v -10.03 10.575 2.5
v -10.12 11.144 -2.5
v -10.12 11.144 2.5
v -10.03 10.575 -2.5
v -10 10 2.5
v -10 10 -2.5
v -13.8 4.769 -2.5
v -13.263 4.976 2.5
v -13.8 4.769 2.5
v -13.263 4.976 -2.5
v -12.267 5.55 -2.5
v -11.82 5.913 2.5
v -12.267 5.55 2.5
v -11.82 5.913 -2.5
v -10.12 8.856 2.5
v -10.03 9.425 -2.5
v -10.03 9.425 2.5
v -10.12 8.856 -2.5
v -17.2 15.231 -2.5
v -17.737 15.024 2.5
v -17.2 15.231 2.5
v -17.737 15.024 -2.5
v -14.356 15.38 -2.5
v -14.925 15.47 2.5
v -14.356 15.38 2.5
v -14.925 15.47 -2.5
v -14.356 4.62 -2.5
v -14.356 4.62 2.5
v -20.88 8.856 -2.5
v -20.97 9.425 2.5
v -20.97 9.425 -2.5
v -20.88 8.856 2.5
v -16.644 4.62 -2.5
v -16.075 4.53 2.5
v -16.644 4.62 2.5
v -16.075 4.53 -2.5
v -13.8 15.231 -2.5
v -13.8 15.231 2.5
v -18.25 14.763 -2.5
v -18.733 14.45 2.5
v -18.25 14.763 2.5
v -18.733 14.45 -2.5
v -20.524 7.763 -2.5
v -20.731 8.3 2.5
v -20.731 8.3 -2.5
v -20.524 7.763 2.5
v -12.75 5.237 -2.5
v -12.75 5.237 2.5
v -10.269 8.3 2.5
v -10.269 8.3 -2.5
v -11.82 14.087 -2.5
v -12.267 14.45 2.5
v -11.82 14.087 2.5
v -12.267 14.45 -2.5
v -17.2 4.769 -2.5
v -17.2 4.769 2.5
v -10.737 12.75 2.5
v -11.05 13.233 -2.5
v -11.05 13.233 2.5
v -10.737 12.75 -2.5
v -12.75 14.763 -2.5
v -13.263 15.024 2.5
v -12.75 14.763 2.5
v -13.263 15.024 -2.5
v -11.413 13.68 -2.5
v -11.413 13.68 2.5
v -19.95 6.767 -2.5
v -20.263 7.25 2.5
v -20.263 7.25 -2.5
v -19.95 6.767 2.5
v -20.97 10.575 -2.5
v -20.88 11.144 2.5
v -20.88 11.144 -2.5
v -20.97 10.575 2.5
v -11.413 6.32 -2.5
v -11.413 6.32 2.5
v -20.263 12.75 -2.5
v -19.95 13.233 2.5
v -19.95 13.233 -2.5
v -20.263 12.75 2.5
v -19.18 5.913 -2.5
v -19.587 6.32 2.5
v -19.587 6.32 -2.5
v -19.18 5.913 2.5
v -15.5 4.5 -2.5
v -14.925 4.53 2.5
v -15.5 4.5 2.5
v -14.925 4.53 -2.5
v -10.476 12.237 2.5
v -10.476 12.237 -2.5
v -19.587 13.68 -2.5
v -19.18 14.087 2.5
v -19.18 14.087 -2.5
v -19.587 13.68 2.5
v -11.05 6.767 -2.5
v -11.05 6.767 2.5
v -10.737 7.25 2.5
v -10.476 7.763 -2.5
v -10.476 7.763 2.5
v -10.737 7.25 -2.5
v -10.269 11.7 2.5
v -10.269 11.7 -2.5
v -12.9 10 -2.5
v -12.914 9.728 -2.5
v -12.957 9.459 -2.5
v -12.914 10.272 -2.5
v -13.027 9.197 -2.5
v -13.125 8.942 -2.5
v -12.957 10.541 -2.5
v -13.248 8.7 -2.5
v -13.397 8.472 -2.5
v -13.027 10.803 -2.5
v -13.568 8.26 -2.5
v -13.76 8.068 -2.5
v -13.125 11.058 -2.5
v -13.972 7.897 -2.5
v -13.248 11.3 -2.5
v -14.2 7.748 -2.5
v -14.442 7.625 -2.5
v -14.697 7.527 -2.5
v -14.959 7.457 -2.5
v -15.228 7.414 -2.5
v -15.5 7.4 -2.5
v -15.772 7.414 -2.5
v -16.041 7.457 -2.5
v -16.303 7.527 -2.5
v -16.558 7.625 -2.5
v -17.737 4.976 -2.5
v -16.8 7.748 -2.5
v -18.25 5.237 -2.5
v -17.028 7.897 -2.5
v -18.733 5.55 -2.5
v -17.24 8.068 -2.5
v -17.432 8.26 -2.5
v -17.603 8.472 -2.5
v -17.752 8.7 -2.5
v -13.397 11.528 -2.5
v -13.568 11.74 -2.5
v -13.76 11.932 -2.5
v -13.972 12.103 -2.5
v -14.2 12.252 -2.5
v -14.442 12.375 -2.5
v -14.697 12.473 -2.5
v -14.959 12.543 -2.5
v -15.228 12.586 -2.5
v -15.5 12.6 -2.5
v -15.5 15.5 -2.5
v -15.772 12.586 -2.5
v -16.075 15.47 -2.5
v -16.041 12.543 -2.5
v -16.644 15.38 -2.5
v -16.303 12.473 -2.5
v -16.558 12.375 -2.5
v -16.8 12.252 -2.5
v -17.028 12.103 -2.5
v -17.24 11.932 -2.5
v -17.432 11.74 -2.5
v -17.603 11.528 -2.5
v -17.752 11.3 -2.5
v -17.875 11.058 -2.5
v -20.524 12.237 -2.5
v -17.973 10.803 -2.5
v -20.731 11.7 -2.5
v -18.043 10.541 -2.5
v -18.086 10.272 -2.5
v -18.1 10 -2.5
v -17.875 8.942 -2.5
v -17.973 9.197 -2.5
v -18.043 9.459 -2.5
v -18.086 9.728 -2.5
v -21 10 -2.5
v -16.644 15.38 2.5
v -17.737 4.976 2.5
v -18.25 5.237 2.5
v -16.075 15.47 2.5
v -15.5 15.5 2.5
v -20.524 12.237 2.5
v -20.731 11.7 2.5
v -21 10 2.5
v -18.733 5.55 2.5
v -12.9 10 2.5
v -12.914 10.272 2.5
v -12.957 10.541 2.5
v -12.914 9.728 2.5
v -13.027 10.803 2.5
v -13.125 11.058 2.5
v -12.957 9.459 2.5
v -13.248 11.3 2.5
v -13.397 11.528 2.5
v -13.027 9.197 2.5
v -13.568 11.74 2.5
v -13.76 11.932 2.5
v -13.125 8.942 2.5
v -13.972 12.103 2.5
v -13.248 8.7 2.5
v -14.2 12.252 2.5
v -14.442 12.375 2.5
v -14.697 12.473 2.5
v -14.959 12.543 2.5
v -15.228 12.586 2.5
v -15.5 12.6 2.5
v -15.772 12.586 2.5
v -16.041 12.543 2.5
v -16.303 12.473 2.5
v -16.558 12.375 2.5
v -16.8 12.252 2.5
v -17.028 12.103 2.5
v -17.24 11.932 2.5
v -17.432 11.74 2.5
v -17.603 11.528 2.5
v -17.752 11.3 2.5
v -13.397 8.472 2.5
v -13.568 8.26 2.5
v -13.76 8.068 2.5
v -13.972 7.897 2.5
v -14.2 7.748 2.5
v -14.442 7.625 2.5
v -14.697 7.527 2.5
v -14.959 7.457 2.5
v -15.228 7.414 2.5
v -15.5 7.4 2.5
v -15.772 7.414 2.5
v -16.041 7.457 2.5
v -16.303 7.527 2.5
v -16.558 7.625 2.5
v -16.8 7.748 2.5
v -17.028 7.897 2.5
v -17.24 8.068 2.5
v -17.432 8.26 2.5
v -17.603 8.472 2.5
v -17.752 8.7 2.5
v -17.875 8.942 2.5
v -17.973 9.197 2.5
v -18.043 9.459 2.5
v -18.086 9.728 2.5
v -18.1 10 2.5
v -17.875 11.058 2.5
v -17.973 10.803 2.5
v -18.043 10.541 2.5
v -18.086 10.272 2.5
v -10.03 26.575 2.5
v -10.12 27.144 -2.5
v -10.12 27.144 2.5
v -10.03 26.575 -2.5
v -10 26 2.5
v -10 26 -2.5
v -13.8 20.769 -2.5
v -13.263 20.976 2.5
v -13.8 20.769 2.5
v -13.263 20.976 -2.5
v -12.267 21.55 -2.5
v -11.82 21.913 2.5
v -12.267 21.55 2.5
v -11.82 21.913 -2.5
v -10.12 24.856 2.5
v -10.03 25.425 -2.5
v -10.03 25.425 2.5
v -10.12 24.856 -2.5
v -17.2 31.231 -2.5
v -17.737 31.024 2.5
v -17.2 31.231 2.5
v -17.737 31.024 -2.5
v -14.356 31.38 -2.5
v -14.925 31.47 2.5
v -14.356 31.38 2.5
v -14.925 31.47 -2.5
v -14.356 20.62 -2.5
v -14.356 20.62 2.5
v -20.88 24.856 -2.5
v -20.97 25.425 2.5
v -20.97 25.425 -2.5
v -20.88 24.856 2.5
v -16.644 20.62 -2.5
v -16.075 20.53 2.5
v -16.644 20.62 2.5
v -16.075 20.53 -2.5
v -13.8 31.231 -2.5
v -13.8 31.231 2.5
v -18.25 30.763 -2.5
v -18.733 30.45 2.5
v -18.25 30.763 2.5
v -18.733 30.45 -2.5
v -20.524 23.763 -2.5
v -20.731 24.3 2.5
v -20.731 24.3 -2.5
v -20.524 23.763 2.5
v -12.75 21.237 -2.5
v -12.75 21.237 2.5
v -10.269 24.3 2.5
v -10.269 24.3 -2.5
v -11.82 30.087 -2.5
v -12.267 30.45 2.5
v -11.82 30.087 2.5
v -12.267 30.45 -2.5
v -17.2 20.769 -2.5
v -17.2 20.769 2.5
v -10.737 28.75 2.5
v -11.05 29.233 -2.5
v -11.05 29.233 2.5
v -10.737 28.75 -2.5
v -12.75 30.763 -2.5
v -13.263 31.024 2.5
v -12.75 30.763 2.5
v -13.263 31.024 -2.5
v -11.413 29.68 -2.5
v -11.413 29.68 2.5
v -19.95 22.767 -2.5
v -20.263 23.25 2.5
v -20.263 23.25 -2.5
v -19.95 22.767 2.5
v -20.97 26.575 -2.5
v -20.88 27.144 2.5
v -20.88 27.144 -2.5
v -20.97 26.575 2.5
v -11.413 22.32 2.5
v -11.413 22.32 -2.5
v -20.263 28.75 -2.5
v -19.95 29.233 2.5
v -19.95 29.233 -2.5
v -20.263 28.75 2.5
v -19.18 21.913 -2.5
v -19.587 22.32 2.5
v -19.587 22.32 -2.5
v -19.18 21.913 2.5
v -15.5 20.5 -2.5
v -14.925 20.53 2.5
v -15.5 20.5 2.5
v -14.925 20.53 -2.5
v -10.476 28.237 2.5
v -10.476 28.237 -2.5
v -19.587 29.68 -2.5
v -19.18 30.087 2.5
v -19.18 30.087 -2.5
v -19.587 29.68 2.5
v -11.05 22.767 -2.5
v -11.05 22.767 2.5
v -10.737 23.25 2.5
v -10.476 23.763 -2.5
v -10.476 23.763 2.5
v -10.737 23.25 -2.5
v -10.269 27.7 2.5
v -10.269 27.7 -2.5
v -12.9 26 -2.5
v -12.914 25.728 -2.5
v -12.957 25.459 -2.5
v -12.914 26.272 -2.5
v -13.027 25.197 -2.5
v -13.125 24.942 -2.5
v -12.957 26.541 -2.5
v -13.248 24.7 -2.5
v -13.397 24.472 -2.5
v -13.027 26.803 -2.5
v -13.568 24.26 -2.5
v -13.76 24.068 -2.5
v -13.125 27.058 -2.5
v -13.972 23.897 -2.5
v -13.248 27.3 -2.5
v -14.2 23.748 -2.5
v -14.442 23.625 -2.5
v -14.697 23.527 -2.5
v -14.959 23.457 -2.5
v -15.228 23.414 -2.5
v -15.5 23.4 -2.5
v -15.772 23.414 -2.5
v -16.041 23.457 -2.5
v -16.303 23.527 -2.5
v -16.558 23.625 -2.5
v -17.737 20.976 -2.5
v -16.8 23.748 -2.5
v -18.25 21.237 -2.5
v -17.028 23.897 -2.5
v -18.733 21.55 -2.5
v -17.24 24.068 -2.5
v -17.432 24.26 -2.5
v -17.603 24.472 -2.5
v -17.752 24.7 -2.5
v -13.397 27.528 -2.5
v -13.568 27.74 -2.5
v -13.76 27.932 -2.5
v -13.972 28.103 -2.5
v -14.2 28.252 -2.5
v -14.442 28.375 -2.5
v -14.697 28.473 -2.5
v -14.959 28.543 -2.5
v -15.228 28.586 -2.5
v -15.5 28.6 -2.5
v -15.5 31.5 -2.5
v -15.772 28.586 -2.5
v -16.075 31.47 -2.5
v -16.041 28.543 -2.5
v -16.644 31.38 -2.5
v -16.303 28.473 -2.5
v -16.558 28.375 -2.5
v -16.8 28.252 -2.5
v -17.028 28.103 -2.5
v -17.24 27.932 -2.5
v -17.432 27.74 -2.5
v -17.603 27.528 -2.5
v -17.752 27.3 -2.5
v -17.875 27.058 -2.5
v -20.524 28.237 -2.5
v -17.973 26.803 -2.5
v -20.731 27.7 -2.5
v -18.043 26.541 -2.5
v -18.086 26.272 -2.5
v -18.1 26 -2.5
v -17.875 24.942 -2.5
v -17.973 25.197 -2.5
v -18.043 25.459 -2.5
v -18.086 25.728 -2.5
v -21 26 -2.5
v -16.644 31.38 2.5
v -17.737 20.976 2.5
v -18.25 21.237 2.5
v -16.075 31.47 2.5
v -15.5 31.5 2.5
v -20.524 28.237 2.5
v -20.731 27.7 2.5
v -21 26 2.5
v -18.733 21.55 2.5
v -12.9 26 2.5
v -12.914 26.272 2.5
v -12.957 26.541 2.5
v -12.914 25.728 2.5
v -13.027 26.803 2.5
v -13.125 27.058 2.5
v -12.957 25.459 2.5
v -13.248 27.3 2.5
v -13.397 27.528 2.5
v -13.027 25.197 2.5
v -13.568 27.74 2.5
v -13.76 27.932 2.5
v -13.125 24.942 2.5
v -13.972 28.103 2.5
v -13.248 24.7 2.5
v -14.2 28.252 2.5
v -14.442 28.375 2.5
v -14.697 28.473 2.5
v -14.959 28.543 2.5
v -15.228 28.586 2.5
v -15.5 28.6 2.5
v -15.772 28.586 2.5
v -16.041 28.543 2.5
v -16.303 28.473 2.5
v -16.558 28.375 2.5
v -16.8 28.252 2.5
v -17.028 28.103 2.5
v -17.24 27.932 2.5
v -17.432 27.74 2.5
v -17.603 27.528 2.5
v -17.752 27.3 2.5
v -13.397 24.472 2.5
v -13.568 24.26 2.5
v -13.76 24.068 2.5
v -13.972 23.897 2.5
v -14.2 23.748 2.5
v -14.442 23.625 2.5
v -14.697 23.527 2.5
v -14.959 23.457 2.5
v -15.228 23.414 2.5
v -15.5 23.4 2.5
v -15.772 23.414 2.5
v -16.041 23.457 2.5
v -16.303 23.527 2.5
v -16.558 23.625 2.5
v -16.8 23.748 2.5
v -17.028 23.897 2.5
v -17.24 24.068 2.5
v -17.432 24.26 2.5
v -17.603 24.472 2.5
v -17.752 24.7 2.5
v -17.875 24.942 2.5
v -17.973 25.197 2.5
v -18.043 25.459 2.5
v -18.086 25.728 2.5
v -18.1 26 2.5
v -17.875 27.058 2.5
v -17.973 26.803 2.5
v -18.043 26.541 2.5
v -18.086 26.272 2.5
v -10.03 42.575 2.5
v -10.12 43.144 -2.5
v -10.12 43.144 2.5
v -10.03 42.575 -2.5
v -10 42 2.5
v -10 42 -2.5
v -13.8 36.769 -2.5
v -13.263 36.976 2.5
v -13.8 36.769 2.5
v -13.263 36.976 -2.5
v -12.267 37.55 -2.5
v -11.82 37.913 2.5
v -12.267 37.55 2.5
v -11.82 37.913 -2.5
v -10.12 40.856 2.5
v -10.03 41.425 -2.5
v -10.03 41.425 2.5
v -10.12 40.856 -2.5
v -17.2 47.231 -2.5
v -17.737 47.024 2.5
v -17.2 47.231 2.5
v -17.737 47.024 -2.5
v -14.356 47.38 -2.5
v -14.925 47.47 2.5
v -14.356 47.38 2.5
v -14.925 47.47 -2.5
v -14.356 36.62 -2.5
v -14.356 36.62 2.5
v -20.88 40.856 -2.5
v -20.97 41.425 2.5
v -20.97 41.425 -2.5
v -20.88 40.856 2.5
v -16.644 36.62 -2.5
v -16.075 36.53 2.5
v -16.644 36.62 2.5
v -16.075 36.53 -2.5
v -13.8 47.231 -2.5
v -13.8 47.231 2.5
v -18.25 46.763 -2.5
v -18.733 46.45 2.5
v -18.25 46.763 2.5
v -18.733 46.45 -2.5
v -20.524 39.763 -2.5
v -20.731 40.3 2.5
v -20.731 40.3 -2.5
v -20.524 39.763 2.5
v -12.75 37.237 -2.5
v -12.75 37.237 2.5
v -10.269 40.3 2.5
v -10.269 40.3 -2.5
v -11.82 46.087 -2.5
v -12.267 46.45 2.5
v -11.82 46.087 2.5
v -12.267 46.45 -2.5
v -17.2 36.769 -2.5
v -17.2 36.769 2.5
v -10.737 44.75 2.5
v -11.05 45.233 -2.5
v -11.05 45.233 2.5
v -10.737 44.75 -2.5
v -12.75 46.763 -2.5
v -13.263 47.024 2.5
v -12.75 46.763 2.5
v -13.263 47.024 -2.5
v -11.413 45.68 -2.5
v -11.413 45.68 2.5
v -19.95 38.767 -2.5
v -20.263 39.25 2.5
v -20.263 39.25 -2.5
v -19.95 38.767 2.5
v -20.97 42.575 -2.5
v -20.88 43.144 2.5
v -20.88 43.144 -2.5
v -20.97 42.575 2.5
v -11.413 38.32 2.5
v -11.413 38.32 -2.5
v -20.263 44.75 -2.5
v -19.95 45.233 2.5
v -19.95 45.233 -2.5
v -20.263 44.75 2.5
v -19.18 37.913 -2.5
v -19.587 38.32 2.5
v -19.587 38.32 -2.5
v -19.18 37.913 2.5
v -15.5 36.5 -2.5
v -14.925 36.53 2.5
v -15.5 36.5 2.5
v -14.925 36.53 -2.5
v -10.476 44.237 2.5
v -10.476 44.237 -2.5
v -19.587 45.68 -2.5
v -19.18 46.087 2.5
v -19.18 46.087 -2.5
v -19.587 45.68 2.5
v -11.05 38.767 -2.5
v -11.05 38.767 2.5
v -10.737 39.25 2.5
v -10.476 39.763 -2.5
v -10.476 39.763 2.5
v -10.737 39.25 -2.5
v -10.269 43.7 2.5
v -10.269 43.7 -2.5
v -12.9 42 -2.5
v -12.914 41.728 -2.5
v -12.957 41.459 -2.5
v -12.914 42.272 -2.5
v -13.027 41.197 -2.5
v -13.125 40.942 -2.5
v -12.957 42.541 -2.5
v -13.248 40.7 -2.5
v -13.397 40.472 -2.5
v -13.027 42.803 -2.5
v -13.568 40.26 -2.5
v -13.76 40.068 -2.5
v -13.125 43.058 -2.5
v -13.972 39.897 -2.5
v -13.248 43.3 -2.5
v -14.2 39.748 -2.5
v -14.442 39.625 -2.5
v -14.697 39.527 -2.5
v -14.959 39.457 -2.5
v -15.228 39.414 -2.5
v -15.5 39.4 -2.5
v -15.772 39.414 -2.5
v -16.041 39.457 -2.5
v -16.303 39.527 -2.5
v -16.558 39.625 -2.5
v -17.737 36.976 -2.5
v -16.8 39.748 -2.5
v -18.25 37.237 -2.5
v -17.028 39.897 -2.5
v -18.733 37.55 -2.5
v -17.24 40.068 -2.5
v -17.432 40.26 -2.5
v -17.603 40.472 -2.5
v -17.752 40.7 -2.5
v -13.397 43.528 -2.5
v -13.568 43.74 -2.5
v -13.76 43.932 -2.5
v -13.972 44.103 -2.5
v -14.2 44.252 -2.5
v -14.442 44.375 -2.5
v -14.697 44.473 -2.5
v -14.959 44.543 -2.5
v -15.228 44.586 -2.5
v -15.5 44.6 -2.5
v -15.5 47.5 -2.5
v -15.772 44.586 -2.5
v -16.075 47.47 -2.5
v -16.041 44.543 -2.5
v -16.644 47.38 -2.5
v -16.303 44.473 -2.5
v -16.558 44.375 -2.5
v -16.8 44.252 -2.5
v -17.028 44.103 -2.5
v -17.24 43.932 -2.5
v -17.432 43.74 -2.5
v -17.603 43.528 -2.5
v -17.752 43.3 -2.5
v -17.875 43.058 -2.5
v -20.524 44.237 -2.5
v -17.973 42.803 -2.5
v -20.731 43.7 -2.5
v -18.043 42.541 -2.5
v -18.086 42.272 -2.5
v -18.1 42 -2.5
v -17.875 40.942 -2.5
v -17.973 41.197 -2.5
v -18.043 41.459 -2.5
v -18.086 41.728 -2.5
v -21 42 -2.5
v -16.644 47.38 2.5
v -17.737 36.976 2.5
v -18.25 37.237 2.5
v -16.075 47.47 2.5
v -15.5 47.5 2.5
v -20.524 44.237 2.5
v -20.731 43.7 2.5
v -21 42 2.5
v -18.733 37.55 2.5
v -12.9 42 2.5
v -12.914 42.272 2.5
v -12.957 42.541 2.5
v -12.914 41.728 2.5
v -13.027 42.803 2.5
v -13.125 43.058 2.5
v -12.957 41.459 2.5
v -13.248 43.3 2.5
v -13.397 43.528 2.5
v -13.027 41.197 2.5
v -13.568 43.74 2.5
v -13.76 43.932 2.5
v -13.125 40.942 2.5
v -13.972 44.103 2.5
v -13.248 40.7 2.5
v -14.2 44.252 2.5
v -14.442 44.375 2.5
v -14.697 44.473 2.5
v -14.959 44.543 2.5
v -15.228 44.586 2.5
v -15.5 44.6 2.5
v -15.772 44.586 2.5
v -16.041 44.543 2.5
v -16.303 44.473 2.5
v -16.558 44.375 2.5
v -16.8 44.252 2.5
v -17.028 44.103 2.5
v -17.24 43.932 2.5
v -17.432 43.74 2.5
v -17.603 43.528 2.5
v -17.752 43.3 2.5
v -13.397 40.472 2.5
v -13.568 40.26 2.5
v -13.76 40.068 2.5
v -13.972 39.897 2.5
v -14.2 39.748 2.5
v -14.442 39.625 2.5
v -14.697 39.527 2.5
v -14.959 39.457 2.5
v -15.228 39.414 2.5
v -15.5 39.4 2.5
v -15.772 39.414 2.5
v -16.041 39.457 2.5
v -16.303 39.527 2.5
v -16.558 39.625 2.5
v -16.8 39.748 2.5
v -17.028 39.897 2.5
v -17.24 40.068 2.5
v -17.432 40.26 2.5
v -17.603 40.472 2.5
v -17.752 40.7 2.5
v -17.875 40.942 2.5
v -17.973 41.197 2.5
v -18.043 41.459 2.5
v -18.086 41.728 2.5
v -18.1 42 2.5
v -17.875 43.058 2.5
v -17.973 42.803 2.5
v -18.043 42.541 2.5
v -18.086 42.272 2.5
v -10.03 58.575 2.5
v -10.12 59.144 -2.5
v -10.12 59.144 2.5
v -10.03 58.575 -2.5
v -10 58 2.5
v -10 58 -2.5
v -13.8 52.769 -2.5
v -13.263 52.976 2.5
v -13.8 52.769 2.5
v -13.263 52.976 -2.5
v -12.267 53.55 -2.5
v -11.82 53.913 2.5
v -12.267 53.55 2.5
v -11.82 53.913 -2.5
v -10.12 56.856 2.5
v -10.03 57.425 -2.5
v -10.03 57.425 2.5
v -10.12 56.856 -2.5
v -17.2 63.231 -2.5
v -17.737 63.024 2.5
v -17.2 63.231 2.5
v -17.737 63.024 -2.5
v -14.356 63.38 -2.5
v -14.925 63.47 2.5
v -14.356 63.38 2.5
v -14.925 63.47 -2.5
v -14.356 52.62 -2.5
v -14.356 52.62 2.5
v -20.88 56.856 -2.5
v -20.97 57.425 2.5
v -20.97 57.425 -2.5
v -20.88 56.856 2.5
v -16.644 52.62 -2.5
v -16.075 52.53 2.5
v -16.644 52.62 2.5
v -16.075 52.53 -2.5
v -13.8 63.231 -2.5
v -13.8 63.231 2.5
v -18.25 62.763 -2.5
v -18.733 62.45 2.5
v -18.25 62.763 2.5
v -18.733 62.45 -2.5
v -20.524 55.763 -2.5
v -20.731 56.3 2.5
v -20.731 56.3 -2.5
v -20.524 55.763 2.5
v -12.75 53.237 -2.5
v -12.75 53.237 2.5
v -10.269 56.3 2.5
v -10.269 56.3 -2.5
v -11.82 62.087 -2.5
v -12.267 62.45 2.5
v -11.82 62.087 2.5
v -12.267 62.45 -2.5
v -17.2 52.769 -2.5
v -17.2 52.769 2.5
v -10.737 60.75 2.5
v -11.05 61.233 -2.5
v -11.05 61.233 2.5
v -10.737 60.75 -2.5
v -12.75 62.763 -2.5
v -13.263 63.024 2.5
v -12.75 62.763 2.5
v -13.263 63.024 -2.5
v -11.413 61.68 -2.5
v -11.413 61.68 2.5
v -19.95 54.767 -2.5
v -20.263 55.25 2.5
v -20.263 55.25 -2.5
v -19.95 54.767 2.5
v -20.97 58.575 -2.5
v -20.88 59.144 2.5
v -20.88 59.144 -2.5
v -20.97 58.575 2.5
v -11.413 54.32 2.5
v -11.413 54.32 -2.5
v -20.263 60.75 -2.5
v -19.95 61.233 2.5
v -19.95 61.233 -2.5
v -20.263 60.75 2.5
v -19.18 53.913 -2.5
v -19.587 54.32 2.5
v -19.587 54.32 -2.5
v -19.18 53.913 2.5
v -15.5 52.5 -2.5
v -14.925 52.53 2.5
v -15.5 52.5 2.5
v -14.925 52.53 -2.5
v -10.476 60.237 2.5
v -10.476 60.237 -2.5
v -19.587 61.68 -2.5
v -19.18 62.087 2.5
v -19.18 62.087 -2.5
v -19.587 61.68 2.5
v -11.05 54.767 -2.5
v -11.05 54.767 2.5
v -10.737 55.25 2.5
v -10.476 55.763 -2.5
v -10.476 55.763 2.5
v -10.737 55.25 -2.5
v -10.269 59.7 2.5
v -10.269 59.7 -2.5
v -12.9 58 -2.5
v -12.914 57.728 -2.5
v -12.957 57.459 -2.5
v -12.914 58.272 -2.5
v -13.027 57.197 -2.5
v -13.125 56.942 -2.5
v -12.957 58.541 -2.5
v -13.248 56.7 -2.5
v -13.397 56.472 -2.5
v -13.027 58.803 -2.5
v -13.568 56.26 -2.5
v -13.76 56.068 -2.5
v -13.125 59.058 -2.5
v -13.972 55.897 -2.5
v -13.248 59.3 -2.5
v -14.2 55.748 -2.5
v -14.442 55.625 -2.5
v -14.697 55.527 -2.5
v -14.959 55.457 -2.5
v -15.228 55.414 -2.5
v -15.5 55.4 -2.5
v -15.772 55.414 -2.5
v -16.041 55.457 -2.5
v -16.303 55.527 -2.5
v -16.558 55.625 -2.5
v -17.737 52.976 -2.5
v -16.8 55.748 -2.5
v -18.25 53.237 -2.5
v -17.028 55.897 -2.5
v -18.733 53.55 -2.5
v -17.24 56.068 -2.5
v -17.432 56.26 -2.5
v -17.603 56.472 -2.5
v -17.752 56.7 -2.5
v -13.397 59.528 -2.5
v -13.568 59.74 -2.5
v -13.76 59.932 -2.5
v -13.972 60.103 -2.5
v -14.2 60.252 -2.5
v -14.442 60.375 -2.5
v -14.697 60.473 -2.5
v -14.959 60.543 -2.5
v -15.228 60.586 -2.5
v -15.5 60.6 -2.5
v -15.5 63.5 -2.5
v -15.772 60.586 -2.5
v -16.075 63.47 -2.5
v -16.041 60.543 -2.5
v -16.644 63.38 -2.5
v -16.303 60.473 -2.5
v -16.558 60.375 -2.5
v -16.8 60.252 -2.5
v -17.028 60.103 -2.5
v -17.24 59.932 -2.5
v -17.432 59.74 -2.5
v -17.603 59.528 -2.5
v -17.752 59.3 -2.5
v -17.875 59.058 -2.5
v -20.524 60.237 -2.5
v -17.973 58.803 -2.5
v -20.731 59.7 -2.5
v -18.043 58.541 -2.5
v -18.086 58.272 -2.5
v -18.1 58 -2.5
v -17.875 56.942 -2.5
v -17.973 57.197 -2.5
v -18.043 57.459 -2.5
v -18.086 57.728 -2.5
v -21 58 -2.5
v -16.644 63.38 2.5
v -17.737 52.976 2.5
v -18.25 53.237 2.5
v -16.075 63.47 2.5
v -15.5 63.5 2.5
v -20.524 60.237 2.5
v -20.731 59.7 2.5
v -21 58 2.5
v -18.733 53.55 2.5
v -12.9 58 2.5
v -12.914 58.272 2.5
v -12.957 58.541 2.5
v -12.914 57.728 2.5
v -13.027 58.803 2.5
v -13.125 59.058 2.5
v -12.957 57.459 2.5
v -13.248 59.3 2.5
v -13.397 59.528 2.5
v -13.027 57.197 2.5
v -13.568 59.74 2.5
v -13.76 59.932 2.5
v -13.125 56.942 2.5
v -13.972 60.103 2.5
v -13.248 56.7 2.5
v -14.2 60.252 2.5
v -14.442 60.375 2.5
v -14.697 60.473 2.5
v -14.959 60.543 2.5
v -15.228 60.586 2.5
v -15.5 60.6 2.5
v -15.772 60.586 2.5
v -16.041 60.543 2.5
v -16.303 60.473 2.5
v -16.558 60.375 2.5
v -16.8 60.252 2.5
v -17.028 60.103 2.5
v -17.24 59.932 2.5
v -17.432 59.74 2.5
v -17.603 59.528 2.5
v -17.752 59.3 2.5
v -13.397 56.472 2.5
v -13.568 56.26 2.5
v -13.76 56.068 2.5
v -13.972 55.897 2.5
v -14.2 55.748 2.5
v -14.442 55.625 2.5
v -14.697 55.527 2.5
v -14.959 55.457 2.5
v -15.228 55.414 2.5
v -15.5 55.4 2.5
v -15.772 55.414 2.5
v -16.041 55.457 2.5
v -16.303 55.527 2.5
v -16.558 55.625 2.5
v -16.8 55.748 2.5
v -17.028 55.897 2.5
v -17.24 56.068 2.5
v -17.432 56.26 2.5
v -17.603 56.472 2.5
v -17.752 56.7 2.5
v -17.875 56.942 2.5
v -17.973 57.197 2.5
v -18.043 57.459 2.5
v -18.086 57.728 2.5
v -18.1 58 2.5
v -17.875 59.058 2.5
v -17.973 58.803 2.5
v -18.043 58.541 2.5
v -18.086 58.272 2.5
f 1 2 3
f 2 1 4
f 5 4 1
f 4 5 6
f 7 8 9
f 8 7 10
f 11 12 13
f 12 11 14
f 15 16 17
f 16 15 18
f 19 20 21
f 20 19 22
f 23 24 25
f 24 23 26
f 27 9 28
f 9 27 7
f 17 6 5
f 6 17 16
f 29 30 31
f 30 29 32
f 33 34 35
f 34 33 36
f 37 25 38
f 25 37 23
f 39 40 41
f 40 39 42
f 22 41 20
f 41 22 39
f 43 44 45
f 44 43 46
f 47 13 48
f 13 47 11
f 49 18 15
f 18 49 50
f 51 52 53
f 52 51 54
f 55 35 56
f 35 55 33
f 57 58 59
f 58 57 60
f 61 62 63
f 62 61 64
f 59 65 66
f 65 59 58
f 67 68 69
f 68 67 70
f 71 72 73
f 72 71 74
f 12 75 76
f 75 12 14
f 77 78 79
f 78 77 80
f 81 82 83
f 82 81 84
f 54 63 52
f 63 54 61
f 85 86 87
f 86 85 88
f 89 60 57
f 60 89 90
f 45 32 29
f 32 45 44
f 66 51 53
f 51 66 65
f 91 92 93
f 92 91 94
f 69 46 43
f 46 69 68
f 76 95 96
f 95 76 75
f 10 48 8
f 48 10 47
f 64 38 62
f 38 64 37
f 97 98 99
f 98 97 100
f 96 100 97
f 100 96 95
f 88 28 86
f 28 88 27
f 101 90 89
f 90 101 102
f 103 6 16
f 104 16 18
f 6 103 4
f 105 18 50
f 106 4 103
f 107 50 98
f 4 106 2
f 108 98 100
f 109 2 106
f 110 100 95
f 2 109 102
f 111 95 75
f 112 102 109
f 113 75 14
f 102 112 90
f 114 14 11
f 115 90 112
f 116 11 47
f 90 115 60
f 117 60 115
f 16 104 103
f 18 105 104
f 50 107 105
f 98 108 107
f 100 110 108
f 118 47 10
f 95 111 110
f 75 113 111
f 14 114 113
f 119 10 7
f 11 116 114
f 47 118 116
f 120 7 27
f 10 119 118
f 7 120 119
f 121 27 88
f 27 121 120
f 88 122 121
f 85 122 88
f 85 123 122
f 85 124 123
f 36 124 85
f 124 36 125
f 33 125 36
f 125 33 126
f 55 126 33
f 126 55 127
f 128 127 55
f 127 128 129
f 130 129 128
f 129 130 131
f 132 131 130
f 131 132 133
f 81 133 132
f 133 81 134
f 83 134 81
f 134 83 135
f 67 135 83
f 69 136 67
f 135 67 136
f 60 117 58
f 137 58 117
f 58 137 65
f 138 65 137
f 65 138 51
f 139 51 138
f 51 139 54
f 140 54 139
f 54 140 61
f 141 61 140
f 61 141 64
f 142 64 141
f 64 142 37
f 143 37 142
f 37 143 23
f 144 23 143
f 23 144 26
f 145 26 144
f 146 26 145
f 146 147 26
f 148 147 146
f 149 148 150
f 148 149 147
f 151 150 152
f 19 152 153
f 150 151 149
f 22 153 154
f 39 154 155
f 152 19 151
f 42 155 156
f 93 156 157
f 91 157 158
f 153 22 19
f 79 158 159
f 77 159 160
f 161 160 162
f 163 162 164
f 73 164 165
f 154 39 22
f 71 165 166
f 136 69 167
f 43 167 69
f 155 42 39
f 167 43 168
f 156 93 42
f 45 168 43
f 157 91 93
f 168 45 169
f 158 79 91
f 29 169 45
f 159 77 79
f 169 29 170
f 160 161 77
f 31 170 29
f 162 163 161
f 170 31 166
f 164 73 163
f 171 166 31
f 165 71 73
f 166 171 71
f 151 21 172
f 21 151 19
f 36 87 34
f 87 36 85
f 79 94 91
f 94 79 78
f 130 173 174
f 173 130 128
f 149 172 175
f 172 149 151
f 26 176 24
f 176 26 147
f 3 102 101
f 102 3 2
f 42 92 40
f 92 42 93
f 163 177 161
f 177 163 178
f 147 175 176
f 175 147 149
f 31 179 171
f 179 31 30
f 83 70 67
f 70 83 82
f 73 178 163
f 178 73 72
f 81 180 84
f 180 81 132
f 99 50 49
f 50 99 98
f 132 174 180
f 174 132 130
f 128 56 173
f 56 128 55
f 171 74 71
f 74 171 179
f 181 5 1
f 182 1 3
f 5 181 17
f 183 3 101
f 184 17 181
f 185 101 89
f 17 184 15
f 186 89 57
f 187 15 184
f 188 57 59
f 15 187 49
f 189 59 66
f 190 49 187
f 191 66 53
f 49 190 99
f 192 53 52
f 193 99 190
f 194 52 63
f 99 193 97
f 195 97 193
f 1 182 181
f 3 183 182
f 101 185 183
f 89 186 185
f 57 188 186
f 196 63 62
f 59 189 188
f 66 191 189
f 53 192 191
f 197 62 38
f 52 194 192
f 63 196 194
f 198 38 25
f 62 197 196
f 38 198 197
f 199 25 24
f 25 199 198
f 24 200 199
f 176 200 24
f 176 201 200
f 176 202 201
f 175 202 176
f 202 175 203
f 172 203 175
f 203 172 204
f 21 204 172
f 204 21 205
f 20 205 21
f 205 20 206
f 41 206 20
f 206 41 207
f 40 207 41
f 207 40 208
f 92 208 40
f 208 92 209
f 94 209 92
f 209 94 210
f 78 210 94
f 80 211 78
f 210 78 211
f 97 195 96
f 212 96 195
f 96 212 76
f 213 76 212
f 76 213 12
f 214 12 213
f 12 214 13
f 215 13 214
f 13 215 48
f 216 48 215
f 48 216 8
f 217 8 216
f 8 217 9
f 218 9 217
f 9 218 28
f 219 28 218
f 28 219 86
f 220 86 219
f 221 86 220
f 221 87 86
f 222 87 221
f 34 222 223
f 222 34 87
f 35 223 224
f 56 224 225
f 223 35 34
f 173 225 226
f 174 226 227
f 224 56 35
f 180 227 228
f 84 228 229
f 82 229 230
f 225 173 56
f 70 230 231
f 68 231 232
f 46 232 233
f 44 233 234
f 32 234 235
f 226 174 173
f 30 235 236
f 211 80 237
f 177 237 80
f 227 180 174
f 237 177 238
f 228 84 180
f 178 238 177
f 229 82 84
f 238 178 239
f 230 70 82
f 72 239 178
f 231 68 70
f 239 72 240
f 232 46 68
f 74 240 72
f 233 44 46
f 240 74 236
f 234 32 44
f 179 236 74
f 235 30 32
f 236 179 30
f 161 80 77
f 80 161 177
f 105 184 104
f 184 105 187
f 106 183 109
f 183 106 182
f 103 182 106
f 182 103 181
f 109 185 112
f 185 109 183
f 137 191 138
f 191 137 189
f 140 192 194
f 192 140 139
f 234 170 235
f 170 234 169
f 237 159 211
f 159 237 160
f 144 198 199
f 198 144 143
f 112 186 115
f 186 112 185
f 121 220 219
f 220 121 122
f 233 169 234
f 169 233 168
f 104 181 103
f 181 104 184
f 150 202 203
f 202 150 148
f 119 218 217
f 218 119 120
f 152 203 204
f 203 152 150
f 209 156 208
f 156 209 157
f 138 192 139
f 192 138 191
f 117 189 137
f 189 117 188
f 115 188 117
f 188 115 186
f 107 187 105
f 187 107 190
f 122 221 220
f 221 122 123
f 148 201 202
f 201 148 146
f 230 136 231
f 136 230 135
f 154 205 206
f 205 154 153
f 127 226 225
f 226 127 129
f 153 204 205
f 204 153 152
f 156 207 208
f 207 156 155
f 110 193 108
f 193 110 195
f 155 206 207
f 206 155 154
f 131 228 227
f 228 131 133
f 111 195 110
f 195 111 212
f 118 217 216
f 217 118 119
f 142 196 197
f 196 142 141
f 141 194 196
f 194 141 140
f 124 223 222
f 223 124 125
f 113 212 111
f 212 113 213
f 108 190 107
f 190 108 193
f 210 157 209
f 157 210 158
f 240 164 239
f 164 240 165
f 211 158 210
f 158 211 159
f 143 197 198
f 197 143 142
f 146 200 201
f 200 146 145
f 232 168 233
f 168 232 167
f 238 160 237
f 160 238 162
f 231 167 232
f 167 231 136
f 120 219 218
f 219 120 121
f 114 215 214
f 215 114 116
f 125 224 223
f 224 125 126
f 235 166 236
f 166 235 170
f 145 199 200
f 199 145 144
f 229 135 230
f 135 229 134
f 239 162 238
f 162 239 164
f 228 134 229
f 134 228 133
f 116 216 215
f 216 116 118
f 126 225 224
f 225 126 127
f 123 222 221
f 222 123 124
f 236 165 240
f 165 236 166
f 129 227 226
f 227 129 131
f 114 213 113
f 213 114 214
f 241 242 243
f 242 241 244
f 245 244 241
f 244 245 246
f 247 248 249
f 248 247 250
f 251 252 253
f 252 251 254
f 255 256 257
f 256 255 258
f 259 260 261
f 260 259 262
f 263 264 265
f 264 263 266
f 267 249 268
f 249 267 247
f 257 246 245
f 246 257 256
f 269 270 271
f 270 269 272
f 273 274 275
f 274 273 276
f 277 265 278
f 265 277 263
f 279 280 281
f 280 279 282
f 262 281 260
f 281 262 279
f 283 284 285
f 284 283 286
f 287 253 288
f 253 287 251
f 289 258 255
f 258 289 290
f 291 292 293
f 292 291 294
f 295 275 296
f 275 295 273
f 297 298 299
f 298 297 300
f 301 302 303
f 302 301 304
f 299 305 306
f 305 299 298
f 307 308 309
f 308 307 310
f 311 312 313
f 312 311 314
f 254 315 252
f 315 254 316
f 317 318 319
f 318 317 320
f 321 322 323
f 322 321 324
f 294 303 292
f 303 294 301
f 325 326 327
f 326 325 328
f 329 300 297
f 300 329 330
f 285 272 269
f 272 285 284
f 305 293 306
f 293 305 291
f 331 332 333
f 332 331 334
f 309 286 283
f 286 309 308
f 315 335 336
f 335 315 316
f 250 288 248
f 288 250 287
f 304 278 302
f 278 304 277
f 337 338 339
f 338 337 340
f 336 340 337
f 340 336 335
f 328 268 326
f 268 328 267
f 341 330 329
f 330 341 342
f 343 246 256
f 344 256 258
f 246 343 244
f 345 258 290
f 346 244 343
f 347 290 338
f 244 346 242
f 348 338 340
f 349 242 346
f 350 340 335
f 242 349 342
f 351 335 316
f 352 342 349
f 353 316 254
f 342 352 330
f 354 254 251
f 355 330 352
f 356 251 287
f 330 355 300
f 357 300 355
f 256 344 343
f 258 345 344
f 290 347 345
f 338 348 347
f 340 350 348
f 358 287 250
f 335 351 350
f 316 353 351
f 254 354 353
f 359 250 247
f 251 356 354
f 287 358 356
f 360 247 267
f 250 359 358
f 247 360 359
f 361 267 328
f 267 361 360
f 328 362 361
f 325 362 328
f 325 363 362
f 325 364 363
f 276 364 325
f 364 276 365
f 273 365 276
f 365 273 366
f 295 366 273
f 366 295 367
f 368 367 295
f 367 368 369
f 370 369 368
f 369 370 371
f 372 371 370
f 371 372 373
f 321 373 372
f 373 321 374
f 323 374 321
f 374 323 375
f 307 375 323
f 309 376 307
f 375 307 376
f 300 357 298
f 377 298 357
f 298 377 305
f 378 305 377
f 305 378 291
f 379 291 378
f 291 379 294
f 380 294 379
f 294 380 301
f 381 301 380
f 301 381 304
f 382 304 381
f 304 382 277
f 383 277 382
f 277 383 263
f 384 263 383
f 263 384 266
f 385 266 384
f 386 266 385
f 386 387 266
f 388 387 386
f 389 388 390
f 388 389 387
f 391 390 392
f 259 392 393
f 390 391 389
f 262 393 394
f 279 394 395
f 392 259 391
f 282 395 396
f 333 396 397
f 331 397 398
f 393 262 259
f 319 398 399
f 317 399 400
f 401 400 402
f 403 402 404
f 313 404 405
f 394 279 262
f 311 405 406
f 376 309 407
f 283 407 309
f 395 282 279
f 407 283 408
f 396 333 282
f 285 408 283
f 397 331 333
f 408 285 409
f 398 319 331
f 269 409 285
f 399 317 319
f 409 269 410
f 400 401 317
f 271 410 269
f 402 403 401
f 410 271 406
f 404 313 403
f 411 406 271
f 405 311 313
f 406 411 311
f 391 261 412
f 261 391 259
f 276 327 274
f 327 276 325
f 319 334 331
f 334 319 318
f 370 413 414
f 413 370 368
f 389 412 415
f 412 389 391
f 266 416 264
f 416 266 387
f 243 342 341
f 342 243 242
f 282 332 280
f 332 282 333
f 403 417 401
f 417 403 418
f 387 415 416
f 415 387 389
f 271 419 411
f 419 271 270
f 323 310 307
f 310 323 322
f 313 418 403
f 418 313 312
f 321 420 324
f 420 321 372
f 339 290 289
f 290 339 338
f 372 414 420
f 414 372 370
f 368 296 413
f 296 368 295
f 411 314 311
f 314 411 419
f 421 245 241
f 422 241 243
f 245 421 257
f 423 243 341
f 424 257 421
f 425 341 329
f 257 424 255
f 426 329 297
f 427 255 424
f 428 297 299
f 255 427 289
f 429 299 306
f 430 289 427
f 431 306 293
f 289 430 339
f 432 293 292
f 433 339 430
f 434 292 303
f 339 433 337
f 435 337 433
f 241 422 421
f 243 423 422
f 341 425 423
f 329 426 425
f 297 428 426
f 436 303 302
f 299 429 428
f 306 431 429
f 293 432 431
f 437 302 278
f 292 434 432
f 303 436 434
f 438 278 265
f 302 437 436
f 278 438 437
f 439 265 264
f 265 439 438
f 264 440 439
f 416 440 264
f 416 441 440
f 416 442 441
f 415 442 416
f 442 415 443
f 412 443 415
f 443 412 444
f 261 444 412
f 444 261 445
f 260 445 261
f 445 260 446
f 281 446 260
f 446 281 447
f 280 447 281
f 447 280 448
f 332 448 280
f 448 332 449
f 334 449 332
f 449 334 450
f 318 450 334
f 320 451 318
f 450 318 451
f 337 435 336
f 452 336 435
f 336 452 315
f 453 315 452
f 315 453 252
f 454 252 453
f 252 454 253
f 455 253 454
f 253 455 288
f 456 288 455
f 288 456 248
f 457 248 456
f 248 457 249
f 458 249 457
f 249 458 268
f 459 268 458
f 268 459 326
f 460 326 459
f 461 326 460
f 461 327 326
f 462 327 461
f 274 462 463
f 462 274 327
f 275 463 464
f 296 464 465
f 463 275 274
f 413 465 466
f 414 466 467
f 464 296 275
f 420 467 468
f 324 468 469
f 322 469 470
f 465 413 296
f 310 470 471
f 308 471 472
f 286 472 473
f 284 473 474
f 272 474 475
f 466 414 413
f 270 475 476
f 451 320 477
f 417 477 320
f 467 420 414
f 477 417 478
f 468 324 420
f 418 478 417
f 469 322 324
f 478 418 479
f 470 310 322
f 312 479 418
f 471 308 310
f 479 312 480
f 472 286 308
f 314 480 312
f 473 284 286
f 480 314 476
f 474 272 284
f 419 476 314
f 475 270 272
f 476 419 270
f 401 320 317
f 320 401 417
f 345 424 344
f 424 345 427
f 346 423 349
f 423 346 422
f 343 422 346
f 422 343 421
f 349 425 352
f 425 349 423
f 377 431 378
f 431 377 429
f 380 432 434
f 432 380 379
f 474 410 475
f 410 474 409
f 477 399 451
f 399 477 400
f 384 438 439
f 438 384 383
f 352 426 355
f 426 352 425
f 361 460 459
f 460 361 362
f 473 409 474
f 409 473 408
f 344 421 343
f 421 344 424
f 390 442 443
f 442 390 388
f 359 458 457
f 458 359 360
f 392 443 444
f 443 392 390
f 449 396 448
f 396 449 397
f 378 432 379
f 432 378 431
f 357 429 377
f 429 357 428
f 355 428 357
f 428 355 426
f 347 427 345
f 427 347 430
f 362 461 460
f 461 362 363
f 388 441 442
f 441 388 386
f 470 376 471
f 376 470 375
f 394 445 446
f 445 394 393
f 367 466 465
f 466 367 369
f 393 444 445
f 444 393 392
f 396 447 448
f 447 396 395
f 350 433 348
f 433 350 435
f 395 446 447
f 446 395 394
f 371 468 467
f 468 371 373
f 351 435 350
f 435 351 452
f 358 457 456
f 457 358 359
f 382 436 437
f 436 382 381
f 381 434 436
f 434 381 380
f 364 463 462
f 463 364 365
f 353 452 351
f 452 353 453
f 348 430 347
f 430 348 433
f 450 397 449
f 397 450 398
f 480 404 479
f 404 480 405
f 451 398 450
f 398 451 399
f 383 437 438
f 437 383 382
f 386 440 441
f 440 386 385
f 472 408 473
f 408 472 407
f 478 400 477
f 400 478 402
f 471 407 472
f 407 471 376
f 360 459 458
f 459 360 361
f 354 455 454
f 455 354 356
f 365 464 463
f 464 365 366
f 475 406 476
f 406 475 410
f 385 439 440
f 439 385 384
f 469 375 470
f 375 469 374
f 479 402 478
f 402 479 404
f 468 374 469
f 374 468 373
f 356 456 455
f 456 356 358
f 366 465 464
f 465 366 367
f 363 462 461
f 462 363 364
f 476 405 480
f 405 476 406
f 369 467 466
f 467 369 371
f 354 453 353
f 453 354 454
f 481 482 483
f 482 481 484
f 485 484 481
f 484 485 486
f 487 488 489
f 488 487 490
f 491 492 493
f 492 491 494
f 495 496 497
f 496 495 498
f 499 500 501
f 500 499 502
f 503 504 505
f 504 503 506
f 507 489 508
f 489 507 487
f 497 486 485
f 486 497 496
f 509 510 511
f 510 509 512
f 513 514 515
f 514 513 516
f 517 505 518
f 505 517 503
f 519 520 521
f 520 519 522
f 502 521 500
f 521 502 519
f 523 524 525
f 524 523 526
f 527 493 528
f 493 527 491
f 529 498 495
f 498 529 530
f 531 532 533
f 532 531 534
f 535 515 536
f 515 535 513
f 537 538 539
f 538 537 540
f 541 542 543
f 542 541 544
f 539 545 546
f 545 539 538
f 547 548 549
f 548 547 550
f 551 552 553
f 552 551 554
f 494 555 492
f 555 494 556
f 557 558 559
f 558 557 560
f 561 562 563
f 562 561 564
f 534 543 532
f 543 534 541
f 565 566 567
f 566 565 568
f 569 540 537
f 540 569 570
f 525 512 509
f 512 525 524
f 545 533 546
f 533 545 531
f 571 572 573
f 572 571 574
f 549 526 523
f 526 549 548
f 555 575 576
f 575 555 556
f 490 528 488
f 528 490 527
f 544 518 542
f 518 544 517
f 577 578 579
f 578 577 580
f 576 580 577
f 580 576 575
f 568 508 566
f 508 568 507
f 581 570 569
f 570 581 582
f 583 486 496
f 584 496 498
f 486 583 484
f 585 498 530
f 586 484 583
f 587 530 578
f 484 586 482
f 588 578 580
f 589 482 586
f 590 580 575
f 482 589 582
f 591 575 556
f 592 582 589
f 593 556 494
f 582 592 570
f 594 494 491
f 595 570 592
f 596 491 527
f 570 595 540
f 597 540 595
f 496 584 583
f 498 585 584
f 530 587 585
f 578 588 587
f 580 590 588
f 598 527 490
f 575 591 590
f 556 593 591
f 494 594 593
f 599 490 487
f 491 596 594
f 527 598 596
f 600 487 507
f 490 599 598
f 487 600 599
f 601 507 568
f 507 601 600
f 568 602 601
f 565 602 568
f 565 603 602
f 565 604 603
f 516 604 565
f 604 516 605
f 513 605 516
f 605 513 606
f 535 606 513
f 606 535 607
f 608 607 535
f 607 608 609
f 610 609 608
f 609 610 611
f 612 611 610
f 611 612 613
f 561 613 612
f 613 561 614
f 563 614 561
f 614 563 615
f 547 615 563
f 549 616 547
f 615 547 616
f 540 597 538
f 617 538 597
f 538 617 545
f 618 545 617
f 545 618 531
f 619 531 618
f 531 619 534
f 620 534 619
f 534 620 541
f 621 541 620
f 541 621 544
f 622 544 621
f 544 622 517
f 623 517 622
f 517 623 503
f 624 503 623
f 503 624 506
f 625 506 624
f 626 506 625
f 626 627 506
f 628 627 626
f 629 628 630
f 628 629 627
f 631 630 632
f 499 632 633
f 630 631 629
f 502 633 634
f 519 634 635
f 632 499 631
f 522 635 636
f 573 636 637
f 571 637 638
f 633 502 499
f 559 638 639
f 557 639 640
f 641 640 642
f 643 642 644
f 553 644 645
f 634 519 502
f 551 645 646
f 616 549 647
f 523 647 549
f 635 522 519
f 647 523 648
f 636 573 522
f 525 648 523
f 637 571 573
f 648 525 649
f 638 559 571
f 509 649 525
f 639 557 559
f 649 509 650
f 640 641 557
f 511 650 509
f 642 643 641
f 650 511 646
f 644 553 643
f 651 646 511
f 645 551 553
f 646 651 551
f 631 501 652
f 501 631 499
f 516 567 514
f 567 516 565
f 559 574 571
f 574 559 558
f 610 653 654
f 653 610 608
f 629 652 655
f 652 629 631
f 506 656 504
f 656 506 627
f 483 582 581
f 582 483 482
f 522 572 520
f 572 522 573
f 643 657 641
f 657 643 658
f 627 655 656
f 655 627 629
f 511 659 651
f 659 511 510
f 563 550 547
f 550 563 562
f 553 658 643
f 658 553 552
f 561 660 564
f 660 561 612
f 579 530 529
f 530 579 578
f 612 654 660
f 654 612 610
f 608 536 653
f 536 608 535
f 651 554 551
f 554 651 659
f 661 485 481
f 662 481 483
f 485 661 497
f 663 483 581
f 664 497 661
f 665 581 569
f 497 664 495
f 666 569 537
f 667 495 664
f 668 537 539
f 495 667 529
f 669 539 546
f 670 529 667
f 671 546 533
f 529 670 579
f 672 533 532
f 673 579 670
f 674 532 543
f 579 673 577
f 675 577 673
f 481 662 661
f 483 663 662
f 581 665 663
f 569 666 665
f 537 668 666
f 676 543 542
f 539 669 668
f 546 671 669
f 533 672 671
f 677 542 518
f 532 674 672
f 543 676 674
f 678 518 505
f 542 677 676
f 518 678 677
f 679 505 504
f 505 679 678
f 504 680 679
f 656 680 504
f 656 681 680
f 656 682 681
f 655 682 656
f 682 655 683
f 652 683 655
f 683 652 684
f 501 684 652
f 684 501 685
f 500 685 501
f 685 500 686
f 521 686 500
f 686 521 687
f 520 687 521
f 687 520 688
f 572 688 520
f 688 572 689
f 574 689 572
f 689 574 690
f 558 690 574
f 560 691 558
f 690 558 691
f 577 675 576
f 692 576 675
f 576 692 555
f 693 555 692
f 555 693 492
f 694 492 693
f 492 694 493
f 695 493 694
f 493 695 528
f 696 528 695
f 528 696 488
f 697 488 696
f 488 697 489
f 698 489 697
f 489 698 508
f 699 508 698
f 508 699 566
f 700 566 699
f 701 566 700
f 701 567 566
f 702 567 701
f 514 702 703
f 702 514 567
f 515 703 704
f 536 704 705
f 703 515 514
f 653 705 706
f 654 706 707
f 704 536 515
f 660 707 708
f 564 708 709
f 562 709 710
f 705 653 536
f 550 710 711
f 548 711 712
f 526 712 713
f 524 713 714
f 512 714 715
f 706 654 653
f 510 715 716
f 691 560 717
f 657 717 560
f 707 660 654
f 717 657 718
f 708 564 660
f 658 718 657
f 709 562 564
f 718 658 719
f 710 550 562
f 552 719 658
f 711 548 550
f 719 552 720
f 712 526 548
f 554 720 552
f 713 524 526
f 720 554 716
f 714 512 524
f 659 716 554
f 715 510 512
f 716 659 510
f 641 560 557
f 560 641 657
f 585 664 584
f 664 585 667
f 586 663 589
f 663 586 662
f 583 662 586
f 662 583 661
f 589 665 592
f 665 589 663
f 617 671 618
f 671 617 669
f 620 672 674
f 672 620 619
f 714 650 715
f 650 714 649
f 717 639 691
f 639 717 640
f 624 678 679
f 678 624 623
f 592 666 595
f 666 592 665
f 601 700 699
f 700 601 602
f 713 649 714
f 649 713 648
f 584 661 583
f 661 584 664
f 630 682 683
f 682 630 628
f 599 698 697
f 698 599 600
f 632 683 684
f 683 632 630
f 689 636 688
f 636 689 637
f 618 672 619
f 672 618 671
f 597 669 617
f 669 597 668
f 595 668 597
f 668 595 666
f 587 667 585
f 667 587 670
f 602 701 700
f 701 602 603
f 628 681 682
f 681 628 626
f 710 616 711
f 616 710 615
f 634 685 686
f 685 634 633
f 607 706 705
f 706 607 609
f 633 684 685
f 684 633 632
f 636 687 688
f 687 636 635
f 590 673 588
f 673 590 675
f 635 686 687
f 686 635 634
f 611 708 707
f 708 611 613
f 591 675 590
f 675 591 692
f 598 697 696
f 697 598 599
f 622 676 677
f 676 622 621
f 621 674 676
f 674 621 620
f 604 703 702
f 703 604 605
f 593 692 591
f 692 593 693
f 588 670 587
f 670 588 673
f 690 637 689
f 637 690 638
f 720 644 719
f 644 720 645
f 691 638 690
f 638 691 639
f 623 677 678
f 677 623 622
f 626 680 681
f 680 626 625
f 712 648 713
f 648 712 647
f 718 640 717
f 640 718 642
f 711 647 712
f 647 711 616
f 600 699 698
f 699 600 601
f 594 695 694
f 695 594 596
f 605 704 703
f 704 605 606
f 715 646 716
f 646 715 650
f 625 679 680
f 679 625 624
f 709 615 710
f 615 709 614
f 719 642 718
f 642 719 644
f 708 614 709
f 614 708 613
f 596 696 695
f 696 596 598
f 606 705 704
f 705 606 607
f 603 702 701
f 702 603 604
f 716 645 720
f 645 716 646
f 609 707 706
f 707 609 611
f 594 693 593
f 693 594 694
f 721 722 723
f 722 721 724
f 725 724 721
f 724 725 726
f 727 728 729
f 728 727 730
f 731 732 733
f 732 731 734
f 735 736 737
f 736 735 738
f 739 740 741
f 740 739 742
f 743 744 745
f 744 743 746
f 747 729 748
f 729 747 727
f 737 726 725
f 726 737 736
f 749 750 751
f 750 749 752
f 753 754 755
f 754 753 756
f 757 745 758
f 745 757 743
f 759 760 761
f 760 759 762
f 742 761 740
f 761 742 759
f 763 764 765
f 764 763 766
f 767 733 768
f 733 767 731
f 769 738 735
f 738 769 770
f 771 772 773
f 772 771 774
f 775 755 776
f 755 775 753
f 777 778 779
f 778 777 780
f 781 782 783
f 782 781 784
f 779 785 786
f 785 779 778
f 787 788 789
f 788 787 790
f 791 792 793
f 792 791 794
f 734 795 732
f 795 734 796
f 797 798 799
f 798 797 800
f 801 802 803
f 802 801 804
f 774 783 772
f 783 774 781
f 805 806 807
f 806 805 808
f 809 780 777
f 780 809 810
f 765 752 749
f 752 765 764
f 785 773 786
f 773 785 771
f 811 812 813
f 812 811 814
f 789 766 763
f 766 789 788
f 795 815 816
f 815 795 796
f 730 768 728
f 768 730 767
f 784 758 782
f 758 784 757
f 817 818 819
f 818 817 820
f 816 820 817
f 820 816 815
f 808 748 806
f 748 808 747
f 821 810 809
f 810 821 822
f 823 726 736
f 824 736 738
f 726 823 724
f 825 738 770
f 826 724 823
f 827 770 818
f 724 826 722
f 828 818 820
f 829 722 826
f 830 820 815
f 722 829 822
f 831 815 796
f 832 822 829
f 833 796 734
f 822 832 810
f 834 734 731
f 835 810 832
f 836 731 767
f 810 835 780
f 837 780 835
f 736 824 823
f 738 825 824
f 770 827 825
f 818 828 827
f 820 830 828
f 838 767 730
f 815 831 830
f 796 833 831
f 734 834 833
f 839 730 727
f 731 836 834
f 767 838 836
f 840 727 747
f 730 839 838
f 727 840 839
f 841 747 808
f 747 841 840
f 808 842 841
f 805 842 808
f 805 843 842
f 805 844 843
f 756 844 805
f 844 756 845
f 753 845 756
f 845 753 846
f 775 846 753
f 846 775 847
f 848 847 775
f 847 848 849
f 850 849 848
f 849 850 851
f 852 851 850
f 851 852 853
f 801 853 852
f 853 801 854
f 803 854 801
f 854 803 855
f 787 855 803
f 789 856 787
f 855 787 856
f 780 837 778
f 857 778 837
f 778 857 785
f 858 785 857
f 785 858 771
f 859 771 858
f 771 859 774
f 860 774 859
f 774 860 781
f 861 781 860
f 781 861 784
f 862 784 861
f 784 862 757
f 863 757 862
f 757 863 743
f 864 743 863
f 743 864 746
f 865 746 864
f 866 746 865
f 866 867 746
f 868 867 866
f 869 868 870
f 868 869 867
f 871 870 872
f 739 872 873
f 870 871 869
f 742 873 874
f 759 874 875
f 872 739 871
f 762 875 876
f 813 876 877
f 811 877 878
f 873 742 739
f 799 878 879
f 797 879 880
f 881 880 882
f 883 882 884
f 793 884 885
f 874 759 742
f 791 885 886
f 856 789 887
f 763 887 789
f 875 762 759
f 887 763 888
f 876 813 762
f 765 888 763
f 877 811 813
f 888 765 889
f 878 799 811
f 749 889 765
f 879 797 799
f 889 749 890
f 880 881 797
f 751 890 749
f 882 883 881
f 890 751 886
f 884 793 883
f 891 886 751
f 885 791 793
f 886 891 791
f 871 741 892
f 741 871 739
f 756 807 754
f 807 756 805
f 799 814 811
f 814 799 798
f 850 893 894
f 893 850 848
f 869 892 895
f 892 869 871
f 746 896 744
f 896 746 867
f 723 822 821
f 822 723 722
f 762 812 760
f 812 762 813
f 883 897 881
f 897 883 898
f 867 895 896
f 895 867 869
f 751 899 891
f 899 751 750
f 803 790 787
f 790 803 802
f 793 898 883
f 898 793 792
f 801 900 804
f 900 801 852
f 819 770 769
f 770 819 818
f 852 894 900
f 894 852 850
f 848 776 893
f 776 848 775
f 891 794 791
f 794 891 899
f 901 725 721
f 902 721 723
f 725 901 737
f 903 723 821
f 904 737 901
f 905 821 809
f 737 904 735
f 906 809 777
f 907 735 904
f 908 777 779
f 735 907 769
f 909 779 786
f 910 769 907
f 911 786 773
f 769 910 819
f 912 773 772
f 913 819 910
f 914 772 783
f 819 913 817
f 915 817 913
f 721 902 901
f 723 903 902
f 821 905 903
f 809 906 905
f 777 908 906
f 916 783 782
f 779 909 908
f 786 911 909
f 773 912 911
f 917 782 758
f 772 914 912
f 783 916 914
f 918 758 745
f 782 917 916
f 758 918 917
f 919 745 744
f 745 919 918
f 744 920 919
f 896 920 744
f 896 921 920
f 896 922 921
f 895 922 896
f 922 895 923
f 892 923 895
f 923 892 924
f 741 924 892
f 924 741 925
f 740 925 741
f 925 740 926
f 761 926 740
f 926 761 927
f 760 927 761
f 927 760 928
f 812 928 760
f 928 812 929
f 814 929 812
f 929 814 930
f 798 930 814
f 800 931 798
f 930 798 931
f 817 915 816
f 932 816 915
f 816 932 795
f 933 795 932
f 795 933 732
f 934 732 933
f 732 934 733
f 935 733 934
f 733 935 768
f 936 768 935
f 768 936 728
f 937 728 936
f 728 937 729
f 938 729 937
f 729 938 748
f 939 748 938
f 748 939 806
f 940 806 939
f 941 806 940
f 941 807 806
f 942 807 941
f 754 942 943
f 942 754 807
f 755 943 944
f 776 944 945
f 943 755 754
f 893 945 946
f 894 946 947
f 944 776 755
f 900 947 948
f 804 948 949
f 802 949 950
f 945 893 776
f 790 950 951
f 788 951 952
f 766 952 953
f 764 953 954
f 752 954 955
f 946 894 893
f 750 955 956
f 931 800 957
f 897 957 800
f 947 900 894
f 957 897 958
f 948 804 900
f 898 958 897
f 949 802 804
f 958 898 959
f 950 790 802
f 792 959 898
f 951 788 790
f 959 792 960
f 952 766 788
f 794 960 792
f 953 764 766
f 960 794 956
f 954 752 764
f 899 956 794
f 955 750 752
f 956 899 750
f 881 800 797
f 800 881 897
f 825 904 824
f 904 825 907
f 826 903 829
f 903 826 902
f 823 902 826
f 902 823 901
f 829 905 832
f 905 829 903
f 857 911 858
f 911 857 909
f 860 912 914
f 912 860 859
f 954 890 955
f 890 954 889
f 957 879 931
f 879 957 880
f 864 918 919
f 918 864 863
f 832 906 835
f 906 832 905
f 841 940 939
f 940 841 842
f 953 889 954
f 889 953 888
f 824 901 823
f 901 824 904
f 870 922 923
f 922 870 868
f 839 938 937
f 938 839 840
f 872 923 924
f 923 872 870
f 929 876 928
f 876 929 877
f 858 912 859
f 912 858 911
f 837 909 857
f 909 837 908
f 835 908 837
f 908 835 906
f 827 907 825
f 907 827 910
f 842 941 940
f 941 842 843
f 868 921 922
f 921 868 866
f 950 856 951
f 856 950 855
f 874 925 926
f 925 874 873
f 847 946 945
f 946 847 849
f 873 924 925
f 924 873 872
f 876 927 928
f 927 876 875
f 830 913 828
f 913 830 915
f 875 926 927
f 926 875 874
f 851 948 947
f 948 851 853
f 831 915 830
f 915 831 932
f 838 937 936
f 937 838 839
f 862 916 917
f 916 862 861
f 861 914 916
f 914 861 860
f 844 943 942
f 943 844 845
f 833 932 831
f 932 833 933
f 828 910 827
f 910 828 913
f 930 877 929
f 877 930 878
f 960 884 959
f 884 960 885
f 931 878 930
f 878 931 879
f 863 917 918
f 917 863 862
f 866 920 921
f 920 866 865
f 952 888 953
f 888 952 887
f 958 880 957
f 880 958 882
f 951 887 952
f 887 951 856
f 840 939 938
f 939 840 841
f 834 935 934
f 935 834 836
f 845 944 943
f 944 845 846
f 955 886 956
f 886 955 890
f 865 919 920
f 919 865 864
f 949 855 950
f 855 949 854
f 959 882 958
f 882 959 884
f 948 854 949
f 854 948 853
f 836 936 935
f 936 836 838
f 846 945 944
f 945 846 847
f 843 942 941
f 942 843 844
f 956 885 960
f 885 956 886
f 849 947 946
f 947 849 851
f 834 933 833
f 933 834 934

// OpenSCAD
$fs=0.25;$fa=6;
union() {
translate([-15.5,10,0])difference(){cylinder(h=5, r=5.5, center=true);
cylinder(h=5, r=2.6, center=true);
}translate([-15.5,26,0])difference(){cylinder(h=5, r=5.5, center=true);
cylinder(h=5, r=2.6, center=true);
}translate([-15.5,42,0])difference(){cylinder(h=5, r=5.5, center=true);
cylinder(h=5, r=2.6, center=true);
}translate([-15.5,58,0])difference(){cylinder(h=5, r=5.5, center=true);
cylinder(h=5, r=2.6, center=true);
}}
